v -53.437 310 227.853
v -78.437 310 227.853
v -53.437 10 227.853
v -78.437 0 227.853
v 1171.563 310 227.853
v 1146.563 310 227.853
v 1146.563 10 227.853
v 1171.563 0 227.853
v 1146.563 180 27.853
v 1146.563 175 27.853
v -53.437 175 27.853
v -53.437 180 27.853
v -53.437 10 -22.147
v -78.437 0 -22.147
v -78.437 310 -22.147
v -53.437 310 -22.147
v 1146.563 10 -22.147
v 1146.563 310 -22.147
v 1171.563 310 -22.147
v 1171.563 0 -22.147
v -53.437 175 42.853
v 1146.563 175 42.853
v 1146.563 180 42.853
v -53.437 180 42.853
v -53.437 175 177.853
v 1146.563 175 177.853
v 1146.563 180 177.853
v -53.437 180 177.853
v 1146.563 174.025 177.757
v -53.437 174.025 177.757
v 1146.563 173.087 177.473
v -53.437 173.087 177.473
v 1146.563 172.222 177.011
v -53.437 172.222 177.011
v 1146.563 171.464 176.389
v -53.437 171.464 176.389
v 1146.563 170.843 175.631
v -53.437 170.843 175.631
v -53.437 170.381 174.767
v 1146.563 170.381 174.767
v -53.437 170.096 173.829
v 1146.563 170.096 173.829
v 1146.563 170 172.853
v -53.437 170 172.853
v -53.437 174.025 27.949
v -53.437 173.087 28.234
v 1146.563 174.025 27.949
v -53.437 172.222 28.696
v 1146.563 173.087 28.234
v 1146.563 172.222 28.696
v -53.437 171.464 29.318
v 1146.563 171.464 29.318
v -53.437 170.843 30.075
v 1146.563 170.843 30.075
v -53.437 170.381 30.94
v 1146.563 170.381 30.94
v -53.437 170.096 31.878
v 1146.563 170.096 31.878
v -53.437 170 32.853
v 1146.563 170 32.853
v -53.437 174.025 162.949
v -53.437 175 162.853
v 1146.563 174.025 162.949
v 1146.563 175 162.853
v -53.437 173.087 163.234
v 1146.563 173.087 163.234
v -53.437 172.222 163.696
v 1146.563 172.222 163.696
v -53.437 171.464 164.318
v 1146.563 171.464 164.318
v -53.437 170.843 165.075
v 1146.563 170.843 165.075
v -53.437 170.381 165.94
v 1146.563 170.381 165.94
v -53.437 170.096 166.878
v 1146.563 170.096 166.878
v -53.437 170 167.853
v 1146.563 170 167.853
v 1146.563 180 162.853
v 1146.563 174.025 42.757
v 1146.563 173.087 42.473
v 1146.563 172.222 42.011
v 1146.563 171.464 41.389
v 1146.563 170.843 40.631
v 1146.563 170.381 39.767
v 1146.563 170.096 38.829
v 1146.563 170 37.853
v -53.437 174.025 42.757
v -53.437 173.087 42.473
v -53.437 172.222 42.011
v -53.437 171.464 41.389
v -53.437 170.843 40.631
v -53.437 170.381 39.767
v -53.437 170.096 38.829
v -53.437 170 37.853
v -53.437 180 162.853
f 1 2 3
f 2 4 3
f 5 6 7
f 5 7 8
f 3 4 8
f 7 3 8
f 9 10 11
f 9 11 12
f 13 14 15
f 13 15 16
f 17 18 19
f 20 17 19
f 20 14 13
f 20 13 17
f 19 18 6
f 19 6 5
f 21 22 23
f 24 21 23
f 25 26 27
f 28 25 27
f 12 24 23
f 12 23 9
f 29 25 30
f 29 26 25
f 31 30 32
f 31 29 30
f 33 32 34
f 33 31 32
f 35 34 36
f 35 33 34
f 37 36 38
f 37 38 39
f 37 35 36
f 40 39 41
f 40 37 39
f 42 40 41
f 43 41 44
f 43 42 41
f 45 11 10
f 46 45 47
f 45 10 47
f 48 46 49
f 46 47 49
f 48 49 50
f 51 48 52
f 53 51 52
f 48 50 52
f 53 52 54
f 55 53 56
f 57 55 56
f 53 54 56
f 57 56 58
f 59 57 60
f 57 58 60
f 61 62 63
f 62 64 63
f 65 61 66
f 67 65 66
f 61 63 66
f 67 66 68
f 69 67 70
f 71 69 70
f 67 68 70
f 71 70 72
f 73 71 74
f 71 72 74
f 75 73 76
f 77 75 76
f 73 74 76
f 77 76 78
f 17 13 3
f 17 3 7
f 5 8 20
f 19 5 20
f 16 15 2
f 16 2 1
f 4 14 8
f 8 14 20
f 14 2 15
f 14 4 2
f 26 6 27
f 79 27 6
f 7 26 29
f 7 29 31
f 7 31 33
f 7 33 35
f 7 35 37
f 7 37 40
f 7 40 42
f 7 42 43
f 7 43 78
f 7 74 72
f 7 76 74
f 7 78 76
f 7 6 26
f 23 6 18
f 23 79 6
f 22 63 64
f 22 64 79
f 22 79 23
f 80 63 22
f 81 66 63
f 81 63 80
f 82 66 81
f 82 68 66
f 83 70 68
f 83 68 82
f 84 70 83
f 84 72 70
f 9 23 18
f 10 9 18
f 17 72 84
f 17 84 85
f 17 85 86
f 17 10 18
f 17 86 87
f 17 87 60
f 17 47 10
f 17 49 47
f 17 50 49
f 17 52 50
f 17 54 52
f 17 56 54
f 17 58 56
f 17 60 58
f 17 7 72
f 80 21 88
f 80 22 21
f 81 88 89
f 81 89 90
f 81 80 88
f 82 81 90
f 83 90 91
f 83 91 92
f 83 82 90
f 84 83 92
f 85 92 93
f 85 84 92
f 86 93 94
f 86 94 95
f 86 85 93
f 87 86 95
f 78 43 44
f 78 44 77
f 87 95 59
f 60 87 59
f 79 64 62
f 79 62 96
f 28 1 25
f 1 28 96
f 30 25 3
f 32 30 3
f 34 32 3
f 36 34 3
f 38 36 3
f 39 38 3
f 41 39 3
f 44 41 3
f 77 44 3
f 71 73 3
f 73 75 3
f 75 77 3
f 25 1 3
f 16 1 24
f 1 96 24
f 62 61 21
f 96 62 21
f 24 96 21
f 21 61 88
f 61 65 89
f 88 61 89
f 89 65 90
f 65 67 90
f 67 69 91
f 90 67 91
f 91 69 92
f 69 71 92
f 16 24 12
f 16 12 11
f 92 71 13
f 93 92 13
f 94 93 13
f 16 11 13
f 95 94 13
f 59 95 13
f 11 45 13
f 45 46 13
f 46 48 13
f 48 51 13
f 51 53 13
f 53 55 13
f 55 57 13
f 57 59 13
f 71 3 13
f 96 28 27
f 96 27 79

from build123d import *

# Parameters (mm, degrees)
SKETCH2_W           = 1250
SKETCH2_H           = 250
BOSS_EXTRUDE1_DEPTH = 10
SKETCH3_W           = 25
SKETCH3_H           = 250
BOSS_EXTRUDE2_DEPTH = 300
SKETCH4_W           = 15
SKETCH4_H           = 10
BOSS_EXTRUDE3_DEPTH = 1200
FILLET1_R           = 5
FILLET3_R           = 5


with BuildPart() as part:
    # Sketch2 → Boss-Extrude1 (new body)
    with BuildSketch(Plane(origin=(0, 0, 0), x_dir=(1, 0, 0), z_dir=(0, 1, 0))):
        with Locations((546.563322885, -102.85317352)):
            Rectangle(SKETCH2_W, SKETCH2_H)
    extrude(amount=BOSS_EXTRUDE1_DEPTH)

    # Sketch3 → Boss-Extrude2 (add)
    with BuildSketch(Plane(origin=(0, 10, 0), x_dir=(1, 0, 0), z_dir=(0, 1, 0))):
        with Locations((-65.936677115, -102.85317352)):
            Rectangle(SKETCH3_W, SKETCH3_H)
        with Locations((1159.063322885, -102.85317352)):
            Rectangle(SKETCH3_W, SKETCH3_H)
    extrude(amount=BOSS_EXTRUDE2_DEPTH)

    # Sketch4 → Boss-Extrude3 (add)
    with BuildSketch(Plane(origin=(-53.436677115, 0, 0), x_dir=(0, 0, -1), z_dir=(1, 0, 0))):
        with Locations((-170.35317352, 175)):
            Rectangle(SKETCH4_W, SKETCH4_H)
        with Locations((-35.35317352, 175)):
            Rectangle(SKETCH4_W, SKETCH4_H)
    extrude(amount=BOSS_EXTRUDE3_DEPTH)

    # Fillet1
    fillet1_edges = [part.edges().sort_by_distance(p)[0] for p in [
        (546.563322885, 170, 177.85317352),
        (546.563322885, 170, 162.85317352),
    ]]
    fillet(fillet1_edges, radius=FILLET1_R)

    # Fillet3
    fillet3_edges = [part.edges().sort_by_distance(p)[0] for p in [
        (546.563322885, 170, 42.85317352),
        (546.563322885, 170, 27.85317352),
    ]]
    fillet(fillet3_edges, radius=FILLET3_R)


solid = part.part
